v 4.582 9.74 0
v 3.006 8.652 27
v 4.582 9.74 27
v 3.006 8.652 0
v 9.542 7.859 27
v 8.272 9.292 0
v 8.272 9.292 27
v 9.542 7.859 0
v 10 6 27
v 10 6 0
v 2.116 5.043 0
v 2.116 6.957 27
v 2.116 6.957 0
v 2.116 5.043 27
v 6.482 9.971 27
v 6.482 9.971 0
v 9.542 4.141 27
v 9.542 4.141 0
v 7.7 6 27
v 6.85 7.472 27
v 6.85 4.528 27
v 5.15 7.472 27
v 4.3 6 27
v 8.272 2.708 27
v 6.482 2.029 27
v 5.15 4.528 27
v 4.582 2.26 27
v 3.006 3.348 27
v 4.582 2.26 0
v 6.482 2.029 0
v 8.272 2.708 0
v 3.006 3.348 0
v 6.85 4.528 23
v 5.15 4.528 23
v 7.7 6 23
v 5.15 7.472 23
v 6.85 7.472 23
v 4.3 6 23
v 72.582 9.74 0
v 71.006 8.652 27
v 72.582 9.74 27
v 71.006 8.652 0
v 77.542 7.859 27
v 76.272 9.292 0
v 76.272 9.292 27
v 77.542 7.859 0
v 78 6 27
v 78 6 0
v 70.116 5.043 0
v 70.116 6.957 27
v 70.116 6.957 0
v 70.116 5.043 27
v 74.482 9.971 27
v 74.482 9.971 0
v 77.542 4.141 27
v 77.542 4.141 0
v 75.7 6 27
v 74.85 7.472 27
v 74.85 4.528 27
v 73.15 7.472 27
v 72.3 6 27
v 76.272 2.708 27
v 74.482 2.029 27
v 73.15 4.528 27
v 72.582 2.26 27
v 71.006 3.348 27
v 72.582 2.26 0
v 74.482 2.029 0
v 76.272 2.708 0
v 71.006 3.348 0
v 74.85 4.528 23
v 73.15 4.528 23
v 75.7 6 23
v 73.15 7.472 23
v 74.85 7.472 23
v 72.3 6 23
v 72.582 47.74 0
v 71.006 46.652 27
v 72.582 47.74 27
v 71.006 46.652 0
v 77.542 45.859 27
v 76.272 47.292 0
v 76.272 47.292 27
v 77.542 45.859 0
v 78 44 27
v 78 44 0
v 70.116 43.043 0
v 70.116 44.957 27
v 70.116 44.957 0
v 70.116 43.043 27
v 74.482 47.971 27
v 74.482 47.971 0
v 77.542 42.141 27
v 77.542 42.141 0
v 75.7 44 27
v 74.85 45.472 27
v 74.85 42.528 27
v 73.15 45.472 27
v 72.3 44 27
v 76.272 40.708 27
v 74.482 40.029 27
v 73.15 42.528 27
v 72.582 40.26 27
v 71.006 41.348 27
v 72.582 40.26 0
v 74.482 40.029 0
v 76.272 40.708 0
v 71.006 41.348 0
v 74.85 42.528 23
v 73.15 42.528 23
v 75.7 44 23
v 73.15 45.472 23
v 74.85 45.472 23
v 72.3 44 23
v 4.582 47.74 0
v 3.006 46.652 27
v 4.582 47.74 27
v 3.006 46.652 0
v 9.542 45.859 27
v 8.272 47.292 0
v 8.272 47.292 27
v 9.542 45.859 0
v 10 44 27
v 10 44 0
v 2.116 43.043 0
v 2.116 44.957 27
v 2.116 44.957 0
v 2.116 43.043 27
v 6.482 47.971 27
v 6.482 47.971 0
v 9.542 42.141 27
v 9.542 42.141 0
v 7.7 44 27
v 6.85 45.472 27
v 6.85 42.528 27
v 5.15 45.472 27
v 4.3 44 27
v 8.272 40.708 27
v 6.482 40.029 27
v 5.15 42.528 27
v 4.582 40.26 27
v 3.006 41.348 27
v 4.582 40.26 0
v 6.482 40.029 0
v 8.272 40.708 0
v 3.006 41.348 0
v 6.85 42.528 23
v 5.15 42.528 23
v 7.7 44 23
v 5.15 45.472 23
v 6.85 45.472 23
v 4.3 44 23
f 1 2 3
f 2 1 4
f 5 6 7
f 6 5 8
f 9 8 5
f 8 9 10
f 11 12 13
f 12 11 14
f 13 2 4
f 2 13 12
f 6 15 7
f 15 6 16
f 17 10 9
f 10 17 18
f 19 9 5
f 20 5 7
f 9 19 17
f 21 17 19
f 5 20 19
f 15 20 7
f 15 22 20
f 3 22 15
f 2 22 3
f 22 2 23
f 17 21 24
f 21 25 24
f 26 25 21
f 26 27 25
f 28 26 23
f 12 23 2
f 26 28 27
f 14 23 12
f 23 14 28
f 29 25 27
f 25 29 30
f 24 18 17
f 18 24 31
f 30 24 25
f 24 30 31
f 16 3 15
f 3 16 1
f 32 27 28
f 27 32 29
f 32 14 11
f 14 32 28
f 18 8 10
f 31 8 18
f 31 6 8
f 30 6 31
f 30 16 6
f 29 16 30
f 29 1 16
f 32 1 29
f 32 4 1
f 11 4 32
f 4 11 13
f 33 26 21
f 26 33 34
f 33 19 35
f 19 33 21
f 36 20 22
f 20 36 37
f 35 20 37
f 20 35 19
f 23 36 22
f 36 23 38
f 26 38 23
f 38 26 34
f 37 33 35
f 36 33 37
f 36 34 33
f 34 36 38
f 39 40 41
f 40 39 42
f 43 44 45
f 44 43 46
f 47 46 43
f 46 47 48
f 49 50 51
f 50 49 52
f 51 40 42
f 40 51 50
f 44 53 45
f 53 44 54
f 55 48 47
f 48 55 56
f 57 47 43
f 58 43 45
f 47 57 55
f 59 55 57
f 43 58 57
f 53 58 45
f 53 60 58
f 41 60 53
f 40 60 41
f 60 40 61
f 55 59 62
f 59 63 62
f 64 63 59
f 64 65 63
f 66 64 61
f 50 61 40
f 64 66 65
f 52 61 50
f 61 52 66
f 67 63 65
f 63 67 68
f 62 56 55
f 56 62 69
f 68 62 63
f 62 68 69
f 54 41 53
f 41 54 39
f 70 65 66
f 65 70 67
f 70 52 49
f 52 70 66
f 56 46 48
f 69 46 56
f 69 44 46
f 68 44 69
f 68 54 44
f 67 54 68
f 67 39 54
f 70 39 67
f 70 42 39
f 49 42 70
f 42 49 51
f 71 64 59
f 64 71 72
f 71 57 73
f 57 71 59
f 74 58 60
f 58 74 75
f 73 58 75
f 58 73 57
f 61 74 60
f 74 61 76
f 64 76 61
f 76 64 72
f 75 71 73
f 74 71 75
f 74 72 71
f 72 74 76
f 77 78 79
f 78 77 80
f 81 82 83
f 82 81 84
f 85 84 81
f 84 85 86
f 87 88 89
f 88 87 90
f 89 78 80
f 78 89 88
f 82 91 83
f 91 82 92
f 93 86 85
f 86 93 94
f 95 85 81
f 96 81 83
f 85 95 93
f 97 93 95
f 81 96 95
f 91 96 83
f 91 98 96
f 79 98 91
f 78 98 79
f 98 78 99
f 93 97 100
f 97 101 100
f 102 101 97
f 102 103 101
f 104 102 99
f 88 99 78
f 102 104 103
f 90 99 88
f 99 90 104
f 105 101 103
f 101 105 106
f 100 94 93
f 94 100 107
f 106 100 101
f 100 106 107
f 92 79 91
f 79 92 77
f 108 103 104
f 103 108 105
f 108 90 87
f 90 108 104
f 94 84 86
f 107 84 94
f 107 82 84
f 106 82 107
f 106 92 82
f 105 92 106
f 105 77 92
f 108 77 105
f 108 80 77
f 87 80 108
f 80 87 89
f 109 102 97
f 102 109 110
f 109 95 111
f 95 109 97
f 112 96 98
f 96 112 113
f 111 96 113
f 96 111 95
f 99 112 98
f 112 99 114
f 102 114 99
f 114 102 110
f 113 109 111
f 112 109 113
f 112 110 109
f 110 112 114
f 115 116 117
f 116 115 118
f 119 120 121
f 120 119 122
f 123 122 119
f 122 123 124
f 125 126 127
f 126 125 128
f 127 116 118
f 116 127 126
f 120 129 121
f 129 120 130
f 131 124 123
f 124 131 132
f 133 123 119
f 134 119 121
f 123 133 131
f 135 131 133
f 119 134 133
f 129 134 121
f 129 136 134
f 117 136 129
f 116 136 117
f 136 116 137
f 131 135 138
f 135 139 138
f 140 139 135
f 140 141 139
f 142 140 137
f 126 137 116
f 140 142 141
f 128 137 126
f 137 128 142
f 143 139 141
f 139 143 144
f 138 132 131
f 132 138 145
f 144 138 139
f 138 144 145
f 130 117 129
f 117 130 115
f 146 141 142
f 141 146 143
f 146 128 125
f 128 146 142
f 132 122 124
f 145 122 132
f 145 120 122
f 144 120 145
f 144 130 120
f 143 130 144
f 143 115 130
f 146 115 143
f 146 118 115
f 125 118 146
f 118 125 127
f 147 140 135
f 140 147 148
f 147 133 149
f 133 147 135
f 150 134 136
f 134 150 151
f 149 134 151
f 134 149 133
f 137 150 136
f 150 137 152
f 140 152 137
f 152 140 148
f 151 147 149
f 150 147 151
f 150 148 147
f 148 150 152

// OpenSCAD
Frontplaatbevestiging(80,50,30,10);

// Frontplaatbevestiging voor implantaatbusjes en M2.5 schroeven
module Frontplaatbevestiging(width,depth,height,dia,dikte=3, // Zelfde params als waarmee de doos werd gemaakt 
 lengtebusje=4, // Hoogte van een busje
 diepte=3) // Verzinking (hoogte frontplaat, of eventueel meer voor een verzonken front)
{ 
 CYLINDERDOORSNEDE=8;
 dikte=dikte-dikte*2+CYLINDERDOORSNEDE/2;
 translate([dia/2+dikte,dia/2+dikte,0]) difference() {
  cylinder(d=CYLINDERDOORSNEDE,h=height-diepte);
  translate([0,0,height-diepte-lengtebusje])cylinder(d=3.4,h=lengtebusje+1);
 }
 translate([width-dia/2-dikte,dia/2+dikte,0])difference() {
  cylinder(d=CYLINDERDOORSNEDE,h=height-diepte);
  translate([0,0,height-diepte-lengtebusje])cylinder(d=3.4,h=lengtebusje+1);
 }
 translate([width-dia/2-dikte,depth-dia/2-dikte,0])difference() {
  cylinder(d=CYLINDERDOORSNEDE,h=height-diepte);
  translate([0,0,height-diepte-lengtebusje])cylinder(d=3.4,h=lengtebusje+1);
 }
 translate([dia/2+dikte,depth-dia/2-dikte,0])difference() {
  cylinder(d=CYLINDERDOORSNEDE,h=height-diepte);
  translate([0,0,height-diepte-lengtebusje])cylinder(d=3.4,h=lengtebusje+1);
 }
}
